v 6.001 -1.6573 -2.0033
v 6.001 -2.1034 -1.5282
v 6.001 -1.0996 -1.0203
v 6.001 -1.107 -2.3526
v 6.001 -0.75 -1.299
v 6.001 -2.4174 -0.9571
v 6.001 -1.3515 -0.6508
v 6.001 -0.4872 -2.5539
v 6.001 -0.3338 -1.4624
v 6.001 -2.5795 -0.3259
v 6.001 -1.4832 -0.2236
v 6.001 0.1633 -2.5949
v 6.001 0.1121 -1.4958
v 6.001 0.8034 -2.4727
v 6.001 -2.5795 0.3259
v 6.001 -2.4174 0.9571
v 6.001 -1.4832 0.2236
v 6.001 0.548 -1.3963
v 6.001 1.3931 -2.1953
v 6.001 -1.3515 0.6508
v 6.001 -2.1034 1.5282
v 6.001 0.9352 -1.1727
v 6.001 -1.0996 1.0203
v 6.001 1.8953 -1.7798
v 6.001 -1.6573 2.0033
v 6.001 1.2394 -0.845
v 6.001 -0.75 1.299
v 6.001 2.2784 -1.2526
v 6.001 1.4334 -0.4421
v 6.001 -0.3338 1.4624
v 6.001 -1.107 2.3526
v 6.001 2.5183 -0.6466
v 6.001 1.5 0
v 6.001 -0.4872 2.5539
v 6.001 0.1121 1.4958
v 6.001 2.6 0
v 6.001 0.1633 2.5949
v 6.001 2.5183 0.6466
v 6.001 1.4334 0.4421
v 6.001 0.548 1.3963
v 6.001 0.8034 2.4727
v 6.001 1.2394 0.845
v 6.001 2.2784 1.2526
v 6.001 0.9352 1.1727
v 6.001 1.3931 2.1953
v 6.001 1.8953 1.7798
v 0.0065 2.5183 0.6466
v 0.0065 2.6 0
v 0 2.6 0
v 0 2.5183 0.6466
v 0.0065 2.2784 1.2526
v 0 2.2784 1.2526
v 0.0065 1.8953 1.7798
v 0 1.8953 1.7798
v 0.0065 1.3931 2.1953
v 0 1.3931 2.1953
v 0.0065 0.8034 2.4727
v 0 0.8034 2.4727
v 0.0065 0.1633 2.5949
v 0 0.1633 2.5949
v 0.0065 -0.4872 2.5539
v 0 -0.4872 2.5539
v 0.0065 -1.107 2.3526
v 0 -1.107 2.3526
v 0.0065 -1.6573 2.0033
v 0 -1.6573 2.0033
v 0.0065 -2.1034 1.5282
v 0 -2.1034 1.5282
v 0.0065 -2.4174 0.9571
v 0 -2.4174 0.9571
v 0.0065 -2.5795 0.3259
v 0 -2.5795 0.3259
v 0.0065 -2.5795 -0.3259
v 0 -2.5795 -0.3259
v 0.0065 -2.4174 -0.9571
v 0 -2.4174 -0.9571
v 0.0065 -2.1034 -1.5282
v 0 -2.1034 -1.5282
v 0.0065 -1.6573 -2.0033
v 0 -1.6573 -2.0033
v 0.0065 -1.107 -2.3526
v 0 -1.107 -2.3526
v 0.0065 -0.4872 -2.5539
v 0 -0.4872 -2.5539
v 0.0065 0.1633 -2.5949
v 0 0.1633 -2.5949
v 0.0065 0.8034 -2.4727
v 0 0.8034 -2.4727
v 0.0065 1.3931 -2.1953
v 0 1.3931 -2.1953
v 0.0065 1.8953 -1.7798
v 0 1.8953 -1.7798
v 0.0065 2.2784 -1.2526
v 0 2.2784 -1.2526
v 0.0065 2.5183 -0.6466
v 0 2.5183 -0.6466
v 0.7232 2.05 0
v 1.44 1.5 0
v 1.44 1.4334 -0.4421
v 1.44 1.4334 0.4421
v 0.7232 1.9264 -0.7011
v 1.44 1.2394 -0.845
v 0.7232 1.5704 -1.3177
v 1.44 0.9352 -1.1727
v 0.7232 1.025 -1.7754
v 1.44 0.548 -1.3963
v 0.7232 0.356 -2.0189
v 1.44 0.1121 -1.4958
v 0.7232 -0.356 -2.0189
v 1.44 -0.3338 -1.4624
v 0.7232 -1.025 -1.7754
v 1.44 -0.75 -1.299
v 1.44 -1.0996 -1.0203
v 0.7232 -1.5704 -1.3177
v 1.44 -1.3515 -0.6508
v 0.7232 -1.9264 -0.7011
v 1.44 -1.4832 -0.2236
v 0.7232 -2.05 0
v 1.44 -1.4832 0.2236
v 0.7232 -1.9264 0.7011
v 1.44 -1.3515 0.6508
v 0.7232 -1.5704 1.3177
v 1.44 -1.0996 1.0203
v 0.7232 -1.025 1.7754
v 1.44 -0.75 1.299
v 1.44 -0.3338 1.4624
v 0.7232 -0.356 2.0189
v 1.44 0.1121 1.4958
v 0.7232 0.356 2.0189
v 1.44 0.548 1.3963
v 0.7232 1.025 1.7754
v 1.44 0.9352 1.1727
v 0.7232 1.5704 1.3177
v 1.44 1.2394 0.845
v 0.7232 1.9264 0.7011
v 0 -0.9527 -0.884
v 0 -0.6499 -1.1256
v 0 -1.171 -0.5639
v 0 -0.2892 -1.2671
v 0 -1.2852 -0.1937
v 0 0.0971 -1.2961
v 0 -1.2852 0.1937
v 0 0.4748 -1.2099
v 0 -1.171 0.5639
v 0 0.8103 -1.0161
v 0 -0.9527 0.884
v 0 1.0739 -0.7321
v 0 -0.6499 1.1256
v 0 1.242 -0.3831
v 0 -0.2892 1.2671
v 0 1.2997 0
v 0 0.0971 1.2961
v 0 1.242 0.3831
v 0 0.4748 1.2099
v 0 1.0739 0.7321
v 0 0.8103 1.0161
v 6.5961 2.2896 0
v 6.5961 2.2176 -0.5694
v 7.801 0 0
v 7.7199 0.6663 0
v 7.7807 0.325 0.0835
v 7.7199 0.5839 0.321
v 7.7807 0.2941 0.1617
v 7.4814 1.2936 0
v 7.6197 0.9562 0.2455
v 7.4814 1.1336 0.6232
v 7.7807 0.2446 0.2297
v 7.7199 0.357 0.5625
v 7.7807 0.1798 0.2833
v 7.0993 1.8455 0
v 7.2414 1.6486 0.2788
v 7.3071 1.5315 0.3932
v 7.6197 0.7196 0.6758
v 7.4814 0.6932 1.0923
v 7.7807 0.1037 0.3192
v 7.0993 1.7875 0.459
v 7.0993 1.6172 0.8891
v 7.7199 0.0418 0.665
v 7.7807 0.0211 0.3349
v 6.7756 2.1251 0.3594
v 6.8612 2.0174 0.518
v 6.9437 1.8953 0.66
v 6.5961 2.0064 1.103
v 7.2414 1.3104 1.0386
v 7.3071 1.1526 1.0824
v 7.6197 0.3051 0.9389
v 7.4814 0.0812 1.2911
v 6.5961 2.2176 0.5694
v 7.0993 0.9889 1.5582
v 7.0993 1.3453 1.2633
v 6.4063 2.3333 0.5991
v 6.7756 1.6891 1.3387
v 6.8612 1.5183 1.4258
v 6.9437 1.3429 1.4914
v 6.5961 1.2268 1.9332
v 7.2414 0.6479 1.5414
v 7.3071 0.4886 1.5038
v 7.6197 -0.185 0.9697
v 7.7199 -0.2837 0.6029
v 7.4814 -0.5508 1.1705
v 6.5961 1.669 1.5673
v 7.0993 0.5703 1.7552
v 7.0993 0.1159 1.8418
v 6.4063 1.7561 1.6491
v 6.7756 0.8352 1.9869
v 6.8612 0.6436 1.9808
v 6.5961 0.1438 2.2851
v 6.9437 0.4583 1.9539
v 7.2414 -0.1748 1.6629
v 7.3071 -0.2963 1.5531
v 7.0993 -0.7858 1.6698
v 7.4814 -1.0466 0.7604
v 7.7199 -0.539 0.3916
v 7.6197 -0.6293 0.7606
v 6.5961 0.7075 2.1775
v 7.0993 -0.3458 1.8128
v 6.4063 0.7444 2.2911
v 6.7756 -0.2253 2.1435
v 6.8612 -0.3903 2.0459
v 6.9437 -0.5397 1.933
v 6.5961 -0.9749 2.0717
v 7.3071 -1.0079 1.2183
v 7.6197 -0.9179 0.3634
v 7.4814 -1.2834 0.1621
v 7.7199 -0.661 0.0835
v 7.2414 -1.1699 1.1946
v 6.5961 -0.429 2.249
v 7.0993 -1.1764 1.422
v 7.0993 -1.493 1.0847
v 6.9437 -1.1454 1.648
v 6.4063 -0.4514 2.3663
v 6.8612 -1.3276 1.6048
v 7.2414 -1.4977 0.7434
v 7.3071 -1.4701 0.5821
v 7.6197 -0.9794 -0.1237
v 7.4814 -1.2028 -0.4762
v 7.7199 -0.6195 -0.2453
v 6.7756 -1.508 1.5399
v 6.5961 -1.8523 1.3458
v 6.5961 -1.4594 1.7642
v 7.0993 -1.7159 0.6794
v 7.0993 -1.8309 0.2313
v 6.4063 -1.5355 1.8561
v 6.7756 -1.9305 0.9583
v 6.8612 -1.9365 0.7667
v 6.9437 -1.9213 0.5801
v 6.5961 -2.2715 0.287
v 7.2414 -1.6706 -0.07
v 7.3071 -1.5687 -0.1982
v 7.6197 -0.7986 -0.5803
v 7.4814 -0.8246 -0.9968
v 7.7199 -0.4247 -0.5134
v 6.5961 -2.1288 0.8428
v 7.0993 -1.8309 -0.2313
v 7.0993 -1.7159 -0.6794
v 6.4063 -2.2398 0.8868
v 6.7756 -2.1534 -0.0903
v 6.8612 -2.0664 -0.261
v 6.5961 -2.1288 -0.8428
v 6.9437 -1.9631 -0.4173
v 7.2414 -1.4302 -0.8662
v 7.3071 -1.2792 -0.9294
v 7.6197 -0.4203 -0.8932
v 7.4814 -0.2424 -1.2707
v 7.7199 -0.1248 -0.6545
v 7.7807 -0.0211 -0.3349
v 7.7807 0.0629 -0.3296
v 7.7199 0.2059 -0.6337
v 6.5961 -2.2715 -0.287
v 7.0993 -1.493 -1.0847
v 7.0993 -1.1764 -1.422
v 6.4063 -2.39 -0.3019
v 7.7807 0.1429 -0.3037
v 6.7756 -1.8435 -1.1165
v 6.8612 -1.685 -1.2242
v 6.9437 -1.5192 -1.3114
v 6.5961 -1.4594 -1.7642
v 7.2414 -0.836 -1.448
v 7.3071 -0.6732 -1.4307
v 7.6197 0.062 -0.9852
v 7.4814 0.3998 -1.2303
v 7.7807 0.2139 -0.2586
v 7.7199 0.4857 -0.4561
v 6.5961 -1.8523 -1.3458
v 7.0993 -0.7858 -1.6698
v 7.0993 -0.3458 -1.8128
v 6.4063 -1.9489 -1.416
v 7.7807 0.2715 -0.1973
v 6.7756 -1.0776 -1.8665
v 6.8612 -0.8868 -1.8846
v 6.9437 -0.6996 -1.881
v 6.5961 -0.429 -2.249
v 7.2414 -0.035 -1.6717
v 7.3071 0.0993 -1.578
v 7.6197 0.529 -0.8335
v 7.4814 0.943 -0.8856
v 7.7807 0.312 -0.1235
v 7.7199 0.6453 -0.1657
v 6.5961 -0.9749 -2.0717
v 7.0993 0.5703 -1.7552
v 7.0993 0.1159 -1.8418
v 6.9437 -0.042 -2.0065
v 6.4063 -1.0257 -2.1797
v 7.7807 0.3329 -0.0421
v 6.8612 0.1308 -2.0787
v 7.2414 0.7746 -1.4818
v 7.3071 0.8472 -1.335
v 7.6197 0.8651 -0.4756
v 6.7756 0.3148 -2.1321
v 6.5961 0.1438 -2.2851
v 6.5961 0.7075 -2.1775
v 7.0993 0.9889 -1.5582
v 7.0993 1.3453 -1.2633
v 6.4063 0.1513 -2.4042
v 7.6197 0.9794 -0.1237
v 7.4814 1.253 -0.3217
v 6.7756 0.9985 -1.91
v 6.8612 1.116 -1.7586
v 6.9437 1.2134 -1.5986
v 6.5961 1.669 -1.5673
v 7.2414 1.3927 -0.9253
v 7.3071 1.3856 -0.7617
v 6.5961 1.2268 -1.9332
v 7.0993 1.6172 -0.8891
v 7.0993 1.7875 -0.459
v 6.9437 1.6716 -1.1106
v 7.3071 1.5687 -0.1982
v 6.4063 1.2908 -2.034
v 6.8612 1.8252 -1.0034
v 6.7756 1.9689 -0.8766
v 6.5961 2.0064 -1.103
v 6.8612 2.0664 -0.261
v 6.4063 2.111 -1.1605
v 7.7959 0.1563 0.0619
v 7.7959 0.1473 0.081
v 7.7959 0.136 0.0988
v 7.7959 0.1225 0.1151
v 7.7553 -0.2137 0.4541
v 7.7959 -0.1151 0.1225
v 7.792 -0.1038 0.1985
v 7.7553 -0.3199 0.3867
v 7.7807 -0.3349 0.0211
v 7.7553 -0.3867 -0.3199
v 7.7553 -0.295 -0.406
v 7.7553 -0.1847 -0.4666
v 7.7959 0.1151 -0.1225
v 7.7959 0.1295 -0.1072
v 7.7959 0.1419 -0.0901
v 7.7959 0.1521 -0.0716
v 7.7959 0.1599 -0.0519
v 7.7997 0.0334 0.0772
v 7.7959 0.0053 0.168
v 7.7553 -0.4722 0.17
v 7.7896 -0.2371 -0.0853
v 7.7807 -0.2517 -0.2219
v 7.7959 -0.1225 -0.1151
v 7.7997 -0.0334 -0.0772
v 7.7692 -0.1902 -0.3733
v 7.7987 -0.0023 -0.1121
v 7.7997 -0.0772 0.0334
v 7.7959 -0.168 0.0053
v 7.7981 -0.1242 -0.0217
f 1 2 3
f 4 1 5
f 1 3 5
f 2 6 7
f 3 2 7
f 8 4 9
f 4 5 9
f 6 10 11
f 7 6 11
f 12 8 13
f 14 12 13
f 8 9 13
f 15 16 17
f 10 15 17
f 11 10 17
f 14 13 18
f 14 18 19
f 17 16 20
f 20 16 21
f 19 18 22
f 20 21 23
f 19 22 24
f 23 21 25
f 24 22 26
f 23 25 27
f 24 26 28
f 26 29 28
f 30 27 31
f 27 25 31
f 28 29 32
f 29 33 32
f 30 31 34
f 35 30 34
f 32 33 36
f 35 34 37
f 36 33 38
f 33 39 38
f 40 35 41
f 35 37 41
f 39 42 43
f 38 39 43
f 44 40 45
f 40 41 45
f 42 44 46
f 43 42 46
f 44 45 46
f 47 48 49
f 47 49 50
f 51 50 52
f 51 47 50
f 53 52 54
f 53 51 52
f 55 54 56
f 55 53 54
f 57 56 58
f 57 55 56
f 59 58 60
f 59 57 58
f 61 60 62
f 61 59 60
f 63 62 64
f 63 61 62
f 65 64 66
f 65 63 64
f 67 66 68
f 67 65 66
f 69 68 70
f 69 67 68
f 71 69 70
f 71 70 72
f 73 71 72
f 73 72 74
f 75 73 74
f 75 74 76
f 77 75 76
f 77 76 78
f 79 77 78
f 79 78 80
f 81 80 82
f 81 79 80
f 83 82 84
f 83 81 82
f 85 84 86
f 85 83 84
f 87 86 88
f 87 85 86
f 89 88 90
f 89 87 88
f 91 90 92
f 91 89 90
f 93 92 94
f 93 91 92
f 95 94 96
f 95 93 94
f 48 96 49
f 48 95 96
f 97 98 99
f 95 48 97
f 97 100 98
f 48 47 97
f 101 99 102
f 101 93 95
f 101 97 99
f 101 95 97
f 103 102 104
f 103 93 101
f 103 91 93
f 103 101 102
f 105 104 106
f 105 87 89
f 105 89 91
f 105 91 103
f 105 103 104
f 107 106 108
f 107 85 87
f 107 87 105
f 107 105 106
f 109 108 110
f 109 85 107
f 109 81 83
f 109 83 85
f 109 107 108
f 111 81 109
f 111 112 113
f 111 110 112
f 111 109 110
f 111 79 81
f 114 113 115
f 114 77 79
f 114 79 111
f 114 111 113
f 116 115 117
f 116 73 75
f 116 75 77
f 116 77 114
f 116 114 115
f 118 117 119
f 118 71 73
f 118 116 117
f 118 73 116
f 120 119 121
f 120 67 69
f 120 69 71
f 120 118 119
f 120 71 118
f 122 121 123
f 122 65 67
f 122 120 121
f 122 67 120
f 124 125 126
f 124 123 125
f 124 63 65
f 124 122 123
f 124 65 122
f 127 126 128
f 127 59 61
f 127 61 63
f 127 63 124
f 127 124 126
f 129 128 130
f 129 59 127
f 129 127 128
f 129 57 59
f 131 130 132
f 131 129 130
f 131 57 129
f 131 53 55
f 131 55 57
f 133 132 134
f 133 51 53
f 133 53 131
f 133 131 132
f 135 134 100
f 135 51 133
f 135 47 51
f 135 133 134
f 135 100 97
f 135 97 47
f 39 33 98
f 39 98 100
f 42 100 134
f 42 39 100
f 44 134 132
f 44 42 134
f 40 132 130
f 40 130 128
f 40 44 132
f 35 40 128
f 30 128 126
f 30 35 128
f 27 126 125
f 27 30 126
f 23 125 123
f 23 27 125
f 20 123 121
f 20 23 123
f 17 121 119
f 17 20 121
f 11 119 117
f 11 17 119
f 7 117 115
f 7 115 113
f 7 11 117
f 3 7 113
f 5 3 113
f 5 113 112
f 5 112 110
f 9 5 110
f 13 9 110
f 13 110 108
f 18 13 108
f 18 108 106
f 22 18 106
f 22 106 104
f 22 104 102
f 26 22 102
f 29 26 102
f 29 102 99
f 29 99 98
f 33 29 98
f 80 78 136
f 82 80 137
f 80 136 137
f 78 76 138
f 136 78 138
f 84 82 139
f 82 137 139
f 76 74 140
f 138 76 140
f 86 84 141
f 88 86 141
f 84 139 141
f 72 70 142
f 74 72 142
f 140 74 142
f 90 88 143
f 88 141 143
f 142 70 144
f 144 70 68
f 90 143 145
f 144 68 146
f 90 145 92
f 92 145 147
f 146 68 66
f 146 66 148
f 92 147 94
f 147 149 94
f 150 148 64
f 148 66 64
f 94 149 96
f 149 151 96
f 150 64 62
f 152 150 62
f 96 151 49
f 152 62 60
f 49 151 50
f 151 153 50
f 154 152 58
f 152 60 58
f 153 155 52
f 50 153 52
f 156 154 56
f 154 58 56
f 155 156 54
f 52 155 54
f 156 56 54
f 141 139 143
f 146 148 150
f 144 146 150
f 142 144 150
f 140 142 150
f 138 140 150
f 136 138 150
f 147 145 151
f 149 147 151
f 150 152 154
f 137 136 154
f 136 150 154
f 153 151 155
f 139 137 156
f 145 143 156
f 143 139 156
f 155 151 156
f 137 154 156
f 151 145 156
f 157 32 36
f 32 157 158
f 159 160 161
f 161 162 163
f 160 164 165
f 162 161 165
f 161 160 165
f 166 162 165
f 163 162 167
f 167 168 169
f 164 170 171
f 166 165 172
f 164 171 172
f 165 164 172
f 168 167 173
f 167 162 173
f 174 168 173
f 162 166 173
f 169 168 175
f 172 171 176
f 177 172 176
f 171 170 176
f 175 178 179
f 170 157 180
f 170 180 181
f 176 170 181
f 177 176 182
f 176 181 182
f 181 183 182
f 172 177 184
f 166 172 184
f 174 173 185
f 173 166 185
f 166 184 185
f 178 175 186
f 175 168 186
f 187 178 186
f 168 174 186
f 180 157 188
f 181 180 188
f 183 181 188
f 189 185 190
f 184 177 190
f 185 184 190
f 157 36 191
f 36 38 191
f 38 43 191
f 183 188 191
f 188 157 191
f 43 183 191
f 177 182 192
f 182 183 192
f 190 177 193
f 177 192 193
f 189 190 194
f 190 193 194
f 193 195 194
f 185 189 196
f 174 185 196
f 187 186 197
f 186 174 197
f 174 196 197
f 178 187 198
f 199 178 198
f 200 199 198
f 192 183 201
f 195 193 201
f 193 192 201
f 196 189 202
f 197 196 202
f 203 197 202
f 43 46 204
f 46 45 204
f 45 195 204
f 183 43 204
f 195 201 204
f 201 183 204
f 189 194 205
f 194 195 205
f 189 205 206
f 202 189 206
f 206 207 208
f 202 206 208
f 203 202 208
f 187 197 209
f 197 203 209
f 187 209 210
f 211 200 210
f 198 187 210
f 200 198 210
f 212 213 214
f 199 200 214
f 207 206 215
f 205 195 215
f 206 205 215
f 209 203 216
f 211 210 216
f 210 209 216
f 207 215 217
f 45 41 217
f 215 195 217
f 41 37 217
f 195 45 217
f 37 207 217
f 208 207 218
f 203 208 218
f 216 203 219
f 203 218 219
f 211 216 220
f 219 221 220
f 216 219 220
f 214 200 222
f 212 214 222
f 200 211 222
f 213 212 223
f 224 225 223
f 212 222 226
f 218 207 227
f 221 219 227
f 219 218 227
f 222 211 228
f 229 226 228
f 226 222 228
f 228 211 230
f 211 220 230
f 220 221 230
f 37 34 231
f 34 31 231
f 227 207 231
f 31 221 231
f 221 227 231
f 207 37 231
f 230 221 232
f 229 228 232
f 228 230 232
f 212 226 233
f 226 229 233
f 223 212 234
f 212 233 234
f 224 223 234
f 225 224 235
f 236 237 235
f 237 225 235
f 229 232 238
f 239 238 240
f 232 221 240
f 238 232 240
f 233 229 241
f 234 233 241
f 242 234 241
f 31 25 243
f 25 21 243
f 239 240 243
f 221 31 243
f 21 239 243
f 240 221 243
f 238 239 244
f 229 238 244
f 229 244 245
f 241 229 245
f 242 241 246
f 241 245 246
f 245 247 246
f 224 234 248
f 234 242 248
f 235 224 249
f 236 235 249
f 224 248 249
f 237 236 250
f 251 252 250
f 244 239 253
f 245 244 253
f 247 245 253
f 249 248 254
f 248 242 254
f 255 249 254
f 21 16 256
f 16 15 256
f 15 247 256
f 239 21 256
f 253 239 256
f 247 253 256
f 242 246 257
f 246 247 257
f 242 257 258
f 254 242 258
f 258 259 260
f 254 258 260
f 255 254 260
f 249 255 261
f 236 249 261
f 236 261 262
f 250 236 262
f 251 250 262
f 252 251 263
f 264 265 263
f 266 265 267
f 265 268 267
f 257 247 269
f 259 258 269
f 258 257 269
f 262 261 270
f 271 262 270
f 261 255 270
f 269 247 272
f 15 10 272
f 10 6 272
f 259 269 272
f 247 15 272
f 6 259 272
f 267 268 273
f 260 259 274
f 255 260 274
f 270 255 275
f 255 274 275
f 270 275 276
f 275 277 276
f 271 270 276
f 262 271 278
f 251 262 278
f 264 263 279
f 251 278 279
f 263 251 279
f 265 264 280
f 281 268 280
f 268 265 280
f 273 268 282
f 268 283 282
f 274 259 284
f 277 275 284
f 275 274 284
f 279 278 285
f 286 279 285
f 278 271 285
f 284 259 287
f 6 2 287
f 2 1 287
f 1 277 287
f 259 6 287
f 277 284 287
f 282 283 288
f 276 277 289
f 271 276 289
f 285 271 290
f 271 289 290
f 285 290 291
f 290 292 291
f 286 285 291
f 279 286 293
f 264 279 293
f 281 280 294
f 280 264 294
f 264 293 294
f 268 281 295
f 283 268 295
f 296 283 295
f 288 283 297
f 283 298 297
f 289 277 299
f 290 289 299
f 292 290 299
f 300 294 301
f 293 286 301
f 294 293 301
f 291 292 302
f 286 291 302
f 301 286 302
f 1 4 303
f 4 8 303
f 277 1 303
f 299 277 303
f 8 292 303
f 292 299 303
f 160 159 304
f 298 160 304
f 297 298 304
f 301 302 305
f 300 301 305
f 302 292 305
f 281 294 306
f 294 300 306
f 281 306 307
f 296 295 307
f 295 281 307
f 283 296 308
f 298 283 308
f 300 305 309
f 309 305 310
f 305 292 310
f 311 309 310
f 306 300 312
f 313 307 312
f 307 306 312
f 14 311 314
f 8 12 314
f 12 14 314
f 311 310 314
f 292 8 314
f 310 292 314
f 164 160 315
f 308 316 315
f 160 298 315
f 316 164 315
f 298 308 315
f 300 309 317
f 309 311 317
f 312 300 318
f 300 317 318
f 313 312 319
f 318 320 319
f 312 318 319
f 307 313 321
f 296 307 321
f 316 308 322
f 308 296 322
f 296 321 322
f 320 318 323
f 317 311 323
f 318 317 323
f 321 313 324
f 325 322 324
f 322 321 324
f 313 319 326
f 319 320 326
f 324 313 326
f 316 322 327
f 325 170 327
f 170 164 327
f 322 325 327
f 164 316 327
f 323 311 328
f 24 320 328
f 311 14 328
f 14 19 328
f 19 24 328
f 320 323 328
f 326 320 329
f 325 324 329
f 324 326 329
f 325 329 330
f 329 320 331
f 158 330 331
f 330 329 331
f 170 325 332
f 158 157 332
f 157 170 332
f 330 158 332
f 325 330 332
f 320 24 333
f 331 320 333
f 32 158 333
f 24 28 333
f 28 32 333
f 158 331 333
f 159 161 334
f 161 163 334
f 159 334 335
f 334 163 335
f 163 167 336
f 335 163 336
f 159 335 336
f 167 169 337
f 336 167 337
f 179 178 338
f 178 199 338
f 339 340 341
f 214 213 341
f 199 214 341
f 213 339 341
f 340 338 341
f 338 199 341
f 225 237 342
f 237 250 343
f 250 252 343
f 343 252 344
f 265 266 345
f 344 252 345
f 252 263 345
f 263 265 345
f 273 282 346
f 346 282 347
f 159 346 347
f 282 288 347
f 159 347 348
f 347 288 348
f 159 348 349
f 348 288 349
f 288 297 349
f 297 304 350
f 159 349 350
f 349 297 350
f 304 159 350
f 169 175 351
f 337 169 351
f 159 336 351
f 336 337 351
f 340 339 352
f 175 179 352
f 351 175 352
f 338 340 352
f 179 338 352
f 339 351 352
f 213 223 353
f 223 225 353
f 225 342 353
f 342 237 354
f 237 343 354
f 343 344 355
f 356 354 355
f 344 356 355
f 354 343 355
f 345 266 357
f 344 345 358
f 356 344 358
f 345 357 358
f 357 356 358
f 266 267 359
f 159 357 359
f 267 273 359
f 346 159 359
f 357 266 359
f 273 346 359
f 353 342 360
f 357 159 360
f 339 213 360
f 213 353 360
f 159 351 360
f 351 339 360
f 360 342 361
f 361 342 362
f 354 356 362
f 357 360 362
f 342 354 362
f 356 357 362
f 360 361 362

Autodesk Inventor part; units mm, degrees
ref_plane "YZ Plane" through (0, 0, 0) normal (1, 0, 0) x (0, 1, 0)
ref_plane "XZ Plane" through (0, 0, 0) normal (0, 1, 0) x (-1, 0, 0)
ref_plane "XY Plane" through (0, 0, 0) normal (0, 0, 1) x (1, 0, 0)
sketch "Sketch" plane through (0, 0, 0) normal (0, 0, 1) x (1, 0, 0)
  line L0 (0, 0) -> (0, 2.6)
  line L1 (0, 2.6) -> (0.0065, 2.6)
  line L2 (0.0065, 2.6) -> (1.44, 1.5)
  line L3 (1.44, 1.5) -> (6.001, 1.5)
  line L4 (6.001, 1.5) -> (6.001, 2.6)
  line L5 (0, 0) -> (7.801, 0)
  arc A0 (7.801, 0) -> (6.001, 2.6) centre (5.0232, 0) ccw
  line L6 (-0.2879, 0) -> (1.7274, 0) projected
  line L7 (0, -0.2166) -> (0, 1.2997) projected
  dimension "d0" = 5.2
  dimension "d1" = 3
  dimension "d2" = 5.2
  dimension "d3" = 1.44
  dimension "d4" = 1.8
  dimension "d5" = 6.001
  dimension "d6" = 37.5
revolve "Body" add sketch "Sketch" angle 360 about axis through (0, 0, 0) along (1, 0, 0)
equation "\"d0\" = KOD"
equation "\"d1\" = NND1"
equation "\"d2\" = KOD1"
equation "\"d3\" = KOH"
equation "\"d4\" = KOH1"
equation "\"d6\" = 0.5 * SEWI"
equation "\"KLG\" = 6"
equation "\"NND1\" = 3"
equation "\"KOH\" = 1.44"
equation "\"KOD\" = 5.2"
equation "\"SEWI\" = 75deg"
equation "\"KOH1\" = 1.8"
equation "\"KOD1\" = 5.2"
equation "\"KLGMIN\" = 1.8"
equation "\"NND\" = 3"
equation "\"KLGMAX\" = 6"
properties part number "DIN 661 - A 3 x 10" material "Steel, Mild"
